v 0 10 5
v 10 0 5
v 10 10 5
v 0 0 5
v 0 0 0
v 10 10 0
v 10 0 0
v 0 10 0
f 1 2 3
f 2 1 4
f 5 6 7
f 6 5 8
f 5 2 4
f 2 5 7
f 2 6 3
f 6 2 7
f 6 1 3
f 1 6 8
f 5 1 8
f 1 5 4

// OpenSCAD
X = 10; //[0:50]
Y = 10; //[0:50]
Z = 5; //[0:20]

cube(size = [X, Y, Z]);
